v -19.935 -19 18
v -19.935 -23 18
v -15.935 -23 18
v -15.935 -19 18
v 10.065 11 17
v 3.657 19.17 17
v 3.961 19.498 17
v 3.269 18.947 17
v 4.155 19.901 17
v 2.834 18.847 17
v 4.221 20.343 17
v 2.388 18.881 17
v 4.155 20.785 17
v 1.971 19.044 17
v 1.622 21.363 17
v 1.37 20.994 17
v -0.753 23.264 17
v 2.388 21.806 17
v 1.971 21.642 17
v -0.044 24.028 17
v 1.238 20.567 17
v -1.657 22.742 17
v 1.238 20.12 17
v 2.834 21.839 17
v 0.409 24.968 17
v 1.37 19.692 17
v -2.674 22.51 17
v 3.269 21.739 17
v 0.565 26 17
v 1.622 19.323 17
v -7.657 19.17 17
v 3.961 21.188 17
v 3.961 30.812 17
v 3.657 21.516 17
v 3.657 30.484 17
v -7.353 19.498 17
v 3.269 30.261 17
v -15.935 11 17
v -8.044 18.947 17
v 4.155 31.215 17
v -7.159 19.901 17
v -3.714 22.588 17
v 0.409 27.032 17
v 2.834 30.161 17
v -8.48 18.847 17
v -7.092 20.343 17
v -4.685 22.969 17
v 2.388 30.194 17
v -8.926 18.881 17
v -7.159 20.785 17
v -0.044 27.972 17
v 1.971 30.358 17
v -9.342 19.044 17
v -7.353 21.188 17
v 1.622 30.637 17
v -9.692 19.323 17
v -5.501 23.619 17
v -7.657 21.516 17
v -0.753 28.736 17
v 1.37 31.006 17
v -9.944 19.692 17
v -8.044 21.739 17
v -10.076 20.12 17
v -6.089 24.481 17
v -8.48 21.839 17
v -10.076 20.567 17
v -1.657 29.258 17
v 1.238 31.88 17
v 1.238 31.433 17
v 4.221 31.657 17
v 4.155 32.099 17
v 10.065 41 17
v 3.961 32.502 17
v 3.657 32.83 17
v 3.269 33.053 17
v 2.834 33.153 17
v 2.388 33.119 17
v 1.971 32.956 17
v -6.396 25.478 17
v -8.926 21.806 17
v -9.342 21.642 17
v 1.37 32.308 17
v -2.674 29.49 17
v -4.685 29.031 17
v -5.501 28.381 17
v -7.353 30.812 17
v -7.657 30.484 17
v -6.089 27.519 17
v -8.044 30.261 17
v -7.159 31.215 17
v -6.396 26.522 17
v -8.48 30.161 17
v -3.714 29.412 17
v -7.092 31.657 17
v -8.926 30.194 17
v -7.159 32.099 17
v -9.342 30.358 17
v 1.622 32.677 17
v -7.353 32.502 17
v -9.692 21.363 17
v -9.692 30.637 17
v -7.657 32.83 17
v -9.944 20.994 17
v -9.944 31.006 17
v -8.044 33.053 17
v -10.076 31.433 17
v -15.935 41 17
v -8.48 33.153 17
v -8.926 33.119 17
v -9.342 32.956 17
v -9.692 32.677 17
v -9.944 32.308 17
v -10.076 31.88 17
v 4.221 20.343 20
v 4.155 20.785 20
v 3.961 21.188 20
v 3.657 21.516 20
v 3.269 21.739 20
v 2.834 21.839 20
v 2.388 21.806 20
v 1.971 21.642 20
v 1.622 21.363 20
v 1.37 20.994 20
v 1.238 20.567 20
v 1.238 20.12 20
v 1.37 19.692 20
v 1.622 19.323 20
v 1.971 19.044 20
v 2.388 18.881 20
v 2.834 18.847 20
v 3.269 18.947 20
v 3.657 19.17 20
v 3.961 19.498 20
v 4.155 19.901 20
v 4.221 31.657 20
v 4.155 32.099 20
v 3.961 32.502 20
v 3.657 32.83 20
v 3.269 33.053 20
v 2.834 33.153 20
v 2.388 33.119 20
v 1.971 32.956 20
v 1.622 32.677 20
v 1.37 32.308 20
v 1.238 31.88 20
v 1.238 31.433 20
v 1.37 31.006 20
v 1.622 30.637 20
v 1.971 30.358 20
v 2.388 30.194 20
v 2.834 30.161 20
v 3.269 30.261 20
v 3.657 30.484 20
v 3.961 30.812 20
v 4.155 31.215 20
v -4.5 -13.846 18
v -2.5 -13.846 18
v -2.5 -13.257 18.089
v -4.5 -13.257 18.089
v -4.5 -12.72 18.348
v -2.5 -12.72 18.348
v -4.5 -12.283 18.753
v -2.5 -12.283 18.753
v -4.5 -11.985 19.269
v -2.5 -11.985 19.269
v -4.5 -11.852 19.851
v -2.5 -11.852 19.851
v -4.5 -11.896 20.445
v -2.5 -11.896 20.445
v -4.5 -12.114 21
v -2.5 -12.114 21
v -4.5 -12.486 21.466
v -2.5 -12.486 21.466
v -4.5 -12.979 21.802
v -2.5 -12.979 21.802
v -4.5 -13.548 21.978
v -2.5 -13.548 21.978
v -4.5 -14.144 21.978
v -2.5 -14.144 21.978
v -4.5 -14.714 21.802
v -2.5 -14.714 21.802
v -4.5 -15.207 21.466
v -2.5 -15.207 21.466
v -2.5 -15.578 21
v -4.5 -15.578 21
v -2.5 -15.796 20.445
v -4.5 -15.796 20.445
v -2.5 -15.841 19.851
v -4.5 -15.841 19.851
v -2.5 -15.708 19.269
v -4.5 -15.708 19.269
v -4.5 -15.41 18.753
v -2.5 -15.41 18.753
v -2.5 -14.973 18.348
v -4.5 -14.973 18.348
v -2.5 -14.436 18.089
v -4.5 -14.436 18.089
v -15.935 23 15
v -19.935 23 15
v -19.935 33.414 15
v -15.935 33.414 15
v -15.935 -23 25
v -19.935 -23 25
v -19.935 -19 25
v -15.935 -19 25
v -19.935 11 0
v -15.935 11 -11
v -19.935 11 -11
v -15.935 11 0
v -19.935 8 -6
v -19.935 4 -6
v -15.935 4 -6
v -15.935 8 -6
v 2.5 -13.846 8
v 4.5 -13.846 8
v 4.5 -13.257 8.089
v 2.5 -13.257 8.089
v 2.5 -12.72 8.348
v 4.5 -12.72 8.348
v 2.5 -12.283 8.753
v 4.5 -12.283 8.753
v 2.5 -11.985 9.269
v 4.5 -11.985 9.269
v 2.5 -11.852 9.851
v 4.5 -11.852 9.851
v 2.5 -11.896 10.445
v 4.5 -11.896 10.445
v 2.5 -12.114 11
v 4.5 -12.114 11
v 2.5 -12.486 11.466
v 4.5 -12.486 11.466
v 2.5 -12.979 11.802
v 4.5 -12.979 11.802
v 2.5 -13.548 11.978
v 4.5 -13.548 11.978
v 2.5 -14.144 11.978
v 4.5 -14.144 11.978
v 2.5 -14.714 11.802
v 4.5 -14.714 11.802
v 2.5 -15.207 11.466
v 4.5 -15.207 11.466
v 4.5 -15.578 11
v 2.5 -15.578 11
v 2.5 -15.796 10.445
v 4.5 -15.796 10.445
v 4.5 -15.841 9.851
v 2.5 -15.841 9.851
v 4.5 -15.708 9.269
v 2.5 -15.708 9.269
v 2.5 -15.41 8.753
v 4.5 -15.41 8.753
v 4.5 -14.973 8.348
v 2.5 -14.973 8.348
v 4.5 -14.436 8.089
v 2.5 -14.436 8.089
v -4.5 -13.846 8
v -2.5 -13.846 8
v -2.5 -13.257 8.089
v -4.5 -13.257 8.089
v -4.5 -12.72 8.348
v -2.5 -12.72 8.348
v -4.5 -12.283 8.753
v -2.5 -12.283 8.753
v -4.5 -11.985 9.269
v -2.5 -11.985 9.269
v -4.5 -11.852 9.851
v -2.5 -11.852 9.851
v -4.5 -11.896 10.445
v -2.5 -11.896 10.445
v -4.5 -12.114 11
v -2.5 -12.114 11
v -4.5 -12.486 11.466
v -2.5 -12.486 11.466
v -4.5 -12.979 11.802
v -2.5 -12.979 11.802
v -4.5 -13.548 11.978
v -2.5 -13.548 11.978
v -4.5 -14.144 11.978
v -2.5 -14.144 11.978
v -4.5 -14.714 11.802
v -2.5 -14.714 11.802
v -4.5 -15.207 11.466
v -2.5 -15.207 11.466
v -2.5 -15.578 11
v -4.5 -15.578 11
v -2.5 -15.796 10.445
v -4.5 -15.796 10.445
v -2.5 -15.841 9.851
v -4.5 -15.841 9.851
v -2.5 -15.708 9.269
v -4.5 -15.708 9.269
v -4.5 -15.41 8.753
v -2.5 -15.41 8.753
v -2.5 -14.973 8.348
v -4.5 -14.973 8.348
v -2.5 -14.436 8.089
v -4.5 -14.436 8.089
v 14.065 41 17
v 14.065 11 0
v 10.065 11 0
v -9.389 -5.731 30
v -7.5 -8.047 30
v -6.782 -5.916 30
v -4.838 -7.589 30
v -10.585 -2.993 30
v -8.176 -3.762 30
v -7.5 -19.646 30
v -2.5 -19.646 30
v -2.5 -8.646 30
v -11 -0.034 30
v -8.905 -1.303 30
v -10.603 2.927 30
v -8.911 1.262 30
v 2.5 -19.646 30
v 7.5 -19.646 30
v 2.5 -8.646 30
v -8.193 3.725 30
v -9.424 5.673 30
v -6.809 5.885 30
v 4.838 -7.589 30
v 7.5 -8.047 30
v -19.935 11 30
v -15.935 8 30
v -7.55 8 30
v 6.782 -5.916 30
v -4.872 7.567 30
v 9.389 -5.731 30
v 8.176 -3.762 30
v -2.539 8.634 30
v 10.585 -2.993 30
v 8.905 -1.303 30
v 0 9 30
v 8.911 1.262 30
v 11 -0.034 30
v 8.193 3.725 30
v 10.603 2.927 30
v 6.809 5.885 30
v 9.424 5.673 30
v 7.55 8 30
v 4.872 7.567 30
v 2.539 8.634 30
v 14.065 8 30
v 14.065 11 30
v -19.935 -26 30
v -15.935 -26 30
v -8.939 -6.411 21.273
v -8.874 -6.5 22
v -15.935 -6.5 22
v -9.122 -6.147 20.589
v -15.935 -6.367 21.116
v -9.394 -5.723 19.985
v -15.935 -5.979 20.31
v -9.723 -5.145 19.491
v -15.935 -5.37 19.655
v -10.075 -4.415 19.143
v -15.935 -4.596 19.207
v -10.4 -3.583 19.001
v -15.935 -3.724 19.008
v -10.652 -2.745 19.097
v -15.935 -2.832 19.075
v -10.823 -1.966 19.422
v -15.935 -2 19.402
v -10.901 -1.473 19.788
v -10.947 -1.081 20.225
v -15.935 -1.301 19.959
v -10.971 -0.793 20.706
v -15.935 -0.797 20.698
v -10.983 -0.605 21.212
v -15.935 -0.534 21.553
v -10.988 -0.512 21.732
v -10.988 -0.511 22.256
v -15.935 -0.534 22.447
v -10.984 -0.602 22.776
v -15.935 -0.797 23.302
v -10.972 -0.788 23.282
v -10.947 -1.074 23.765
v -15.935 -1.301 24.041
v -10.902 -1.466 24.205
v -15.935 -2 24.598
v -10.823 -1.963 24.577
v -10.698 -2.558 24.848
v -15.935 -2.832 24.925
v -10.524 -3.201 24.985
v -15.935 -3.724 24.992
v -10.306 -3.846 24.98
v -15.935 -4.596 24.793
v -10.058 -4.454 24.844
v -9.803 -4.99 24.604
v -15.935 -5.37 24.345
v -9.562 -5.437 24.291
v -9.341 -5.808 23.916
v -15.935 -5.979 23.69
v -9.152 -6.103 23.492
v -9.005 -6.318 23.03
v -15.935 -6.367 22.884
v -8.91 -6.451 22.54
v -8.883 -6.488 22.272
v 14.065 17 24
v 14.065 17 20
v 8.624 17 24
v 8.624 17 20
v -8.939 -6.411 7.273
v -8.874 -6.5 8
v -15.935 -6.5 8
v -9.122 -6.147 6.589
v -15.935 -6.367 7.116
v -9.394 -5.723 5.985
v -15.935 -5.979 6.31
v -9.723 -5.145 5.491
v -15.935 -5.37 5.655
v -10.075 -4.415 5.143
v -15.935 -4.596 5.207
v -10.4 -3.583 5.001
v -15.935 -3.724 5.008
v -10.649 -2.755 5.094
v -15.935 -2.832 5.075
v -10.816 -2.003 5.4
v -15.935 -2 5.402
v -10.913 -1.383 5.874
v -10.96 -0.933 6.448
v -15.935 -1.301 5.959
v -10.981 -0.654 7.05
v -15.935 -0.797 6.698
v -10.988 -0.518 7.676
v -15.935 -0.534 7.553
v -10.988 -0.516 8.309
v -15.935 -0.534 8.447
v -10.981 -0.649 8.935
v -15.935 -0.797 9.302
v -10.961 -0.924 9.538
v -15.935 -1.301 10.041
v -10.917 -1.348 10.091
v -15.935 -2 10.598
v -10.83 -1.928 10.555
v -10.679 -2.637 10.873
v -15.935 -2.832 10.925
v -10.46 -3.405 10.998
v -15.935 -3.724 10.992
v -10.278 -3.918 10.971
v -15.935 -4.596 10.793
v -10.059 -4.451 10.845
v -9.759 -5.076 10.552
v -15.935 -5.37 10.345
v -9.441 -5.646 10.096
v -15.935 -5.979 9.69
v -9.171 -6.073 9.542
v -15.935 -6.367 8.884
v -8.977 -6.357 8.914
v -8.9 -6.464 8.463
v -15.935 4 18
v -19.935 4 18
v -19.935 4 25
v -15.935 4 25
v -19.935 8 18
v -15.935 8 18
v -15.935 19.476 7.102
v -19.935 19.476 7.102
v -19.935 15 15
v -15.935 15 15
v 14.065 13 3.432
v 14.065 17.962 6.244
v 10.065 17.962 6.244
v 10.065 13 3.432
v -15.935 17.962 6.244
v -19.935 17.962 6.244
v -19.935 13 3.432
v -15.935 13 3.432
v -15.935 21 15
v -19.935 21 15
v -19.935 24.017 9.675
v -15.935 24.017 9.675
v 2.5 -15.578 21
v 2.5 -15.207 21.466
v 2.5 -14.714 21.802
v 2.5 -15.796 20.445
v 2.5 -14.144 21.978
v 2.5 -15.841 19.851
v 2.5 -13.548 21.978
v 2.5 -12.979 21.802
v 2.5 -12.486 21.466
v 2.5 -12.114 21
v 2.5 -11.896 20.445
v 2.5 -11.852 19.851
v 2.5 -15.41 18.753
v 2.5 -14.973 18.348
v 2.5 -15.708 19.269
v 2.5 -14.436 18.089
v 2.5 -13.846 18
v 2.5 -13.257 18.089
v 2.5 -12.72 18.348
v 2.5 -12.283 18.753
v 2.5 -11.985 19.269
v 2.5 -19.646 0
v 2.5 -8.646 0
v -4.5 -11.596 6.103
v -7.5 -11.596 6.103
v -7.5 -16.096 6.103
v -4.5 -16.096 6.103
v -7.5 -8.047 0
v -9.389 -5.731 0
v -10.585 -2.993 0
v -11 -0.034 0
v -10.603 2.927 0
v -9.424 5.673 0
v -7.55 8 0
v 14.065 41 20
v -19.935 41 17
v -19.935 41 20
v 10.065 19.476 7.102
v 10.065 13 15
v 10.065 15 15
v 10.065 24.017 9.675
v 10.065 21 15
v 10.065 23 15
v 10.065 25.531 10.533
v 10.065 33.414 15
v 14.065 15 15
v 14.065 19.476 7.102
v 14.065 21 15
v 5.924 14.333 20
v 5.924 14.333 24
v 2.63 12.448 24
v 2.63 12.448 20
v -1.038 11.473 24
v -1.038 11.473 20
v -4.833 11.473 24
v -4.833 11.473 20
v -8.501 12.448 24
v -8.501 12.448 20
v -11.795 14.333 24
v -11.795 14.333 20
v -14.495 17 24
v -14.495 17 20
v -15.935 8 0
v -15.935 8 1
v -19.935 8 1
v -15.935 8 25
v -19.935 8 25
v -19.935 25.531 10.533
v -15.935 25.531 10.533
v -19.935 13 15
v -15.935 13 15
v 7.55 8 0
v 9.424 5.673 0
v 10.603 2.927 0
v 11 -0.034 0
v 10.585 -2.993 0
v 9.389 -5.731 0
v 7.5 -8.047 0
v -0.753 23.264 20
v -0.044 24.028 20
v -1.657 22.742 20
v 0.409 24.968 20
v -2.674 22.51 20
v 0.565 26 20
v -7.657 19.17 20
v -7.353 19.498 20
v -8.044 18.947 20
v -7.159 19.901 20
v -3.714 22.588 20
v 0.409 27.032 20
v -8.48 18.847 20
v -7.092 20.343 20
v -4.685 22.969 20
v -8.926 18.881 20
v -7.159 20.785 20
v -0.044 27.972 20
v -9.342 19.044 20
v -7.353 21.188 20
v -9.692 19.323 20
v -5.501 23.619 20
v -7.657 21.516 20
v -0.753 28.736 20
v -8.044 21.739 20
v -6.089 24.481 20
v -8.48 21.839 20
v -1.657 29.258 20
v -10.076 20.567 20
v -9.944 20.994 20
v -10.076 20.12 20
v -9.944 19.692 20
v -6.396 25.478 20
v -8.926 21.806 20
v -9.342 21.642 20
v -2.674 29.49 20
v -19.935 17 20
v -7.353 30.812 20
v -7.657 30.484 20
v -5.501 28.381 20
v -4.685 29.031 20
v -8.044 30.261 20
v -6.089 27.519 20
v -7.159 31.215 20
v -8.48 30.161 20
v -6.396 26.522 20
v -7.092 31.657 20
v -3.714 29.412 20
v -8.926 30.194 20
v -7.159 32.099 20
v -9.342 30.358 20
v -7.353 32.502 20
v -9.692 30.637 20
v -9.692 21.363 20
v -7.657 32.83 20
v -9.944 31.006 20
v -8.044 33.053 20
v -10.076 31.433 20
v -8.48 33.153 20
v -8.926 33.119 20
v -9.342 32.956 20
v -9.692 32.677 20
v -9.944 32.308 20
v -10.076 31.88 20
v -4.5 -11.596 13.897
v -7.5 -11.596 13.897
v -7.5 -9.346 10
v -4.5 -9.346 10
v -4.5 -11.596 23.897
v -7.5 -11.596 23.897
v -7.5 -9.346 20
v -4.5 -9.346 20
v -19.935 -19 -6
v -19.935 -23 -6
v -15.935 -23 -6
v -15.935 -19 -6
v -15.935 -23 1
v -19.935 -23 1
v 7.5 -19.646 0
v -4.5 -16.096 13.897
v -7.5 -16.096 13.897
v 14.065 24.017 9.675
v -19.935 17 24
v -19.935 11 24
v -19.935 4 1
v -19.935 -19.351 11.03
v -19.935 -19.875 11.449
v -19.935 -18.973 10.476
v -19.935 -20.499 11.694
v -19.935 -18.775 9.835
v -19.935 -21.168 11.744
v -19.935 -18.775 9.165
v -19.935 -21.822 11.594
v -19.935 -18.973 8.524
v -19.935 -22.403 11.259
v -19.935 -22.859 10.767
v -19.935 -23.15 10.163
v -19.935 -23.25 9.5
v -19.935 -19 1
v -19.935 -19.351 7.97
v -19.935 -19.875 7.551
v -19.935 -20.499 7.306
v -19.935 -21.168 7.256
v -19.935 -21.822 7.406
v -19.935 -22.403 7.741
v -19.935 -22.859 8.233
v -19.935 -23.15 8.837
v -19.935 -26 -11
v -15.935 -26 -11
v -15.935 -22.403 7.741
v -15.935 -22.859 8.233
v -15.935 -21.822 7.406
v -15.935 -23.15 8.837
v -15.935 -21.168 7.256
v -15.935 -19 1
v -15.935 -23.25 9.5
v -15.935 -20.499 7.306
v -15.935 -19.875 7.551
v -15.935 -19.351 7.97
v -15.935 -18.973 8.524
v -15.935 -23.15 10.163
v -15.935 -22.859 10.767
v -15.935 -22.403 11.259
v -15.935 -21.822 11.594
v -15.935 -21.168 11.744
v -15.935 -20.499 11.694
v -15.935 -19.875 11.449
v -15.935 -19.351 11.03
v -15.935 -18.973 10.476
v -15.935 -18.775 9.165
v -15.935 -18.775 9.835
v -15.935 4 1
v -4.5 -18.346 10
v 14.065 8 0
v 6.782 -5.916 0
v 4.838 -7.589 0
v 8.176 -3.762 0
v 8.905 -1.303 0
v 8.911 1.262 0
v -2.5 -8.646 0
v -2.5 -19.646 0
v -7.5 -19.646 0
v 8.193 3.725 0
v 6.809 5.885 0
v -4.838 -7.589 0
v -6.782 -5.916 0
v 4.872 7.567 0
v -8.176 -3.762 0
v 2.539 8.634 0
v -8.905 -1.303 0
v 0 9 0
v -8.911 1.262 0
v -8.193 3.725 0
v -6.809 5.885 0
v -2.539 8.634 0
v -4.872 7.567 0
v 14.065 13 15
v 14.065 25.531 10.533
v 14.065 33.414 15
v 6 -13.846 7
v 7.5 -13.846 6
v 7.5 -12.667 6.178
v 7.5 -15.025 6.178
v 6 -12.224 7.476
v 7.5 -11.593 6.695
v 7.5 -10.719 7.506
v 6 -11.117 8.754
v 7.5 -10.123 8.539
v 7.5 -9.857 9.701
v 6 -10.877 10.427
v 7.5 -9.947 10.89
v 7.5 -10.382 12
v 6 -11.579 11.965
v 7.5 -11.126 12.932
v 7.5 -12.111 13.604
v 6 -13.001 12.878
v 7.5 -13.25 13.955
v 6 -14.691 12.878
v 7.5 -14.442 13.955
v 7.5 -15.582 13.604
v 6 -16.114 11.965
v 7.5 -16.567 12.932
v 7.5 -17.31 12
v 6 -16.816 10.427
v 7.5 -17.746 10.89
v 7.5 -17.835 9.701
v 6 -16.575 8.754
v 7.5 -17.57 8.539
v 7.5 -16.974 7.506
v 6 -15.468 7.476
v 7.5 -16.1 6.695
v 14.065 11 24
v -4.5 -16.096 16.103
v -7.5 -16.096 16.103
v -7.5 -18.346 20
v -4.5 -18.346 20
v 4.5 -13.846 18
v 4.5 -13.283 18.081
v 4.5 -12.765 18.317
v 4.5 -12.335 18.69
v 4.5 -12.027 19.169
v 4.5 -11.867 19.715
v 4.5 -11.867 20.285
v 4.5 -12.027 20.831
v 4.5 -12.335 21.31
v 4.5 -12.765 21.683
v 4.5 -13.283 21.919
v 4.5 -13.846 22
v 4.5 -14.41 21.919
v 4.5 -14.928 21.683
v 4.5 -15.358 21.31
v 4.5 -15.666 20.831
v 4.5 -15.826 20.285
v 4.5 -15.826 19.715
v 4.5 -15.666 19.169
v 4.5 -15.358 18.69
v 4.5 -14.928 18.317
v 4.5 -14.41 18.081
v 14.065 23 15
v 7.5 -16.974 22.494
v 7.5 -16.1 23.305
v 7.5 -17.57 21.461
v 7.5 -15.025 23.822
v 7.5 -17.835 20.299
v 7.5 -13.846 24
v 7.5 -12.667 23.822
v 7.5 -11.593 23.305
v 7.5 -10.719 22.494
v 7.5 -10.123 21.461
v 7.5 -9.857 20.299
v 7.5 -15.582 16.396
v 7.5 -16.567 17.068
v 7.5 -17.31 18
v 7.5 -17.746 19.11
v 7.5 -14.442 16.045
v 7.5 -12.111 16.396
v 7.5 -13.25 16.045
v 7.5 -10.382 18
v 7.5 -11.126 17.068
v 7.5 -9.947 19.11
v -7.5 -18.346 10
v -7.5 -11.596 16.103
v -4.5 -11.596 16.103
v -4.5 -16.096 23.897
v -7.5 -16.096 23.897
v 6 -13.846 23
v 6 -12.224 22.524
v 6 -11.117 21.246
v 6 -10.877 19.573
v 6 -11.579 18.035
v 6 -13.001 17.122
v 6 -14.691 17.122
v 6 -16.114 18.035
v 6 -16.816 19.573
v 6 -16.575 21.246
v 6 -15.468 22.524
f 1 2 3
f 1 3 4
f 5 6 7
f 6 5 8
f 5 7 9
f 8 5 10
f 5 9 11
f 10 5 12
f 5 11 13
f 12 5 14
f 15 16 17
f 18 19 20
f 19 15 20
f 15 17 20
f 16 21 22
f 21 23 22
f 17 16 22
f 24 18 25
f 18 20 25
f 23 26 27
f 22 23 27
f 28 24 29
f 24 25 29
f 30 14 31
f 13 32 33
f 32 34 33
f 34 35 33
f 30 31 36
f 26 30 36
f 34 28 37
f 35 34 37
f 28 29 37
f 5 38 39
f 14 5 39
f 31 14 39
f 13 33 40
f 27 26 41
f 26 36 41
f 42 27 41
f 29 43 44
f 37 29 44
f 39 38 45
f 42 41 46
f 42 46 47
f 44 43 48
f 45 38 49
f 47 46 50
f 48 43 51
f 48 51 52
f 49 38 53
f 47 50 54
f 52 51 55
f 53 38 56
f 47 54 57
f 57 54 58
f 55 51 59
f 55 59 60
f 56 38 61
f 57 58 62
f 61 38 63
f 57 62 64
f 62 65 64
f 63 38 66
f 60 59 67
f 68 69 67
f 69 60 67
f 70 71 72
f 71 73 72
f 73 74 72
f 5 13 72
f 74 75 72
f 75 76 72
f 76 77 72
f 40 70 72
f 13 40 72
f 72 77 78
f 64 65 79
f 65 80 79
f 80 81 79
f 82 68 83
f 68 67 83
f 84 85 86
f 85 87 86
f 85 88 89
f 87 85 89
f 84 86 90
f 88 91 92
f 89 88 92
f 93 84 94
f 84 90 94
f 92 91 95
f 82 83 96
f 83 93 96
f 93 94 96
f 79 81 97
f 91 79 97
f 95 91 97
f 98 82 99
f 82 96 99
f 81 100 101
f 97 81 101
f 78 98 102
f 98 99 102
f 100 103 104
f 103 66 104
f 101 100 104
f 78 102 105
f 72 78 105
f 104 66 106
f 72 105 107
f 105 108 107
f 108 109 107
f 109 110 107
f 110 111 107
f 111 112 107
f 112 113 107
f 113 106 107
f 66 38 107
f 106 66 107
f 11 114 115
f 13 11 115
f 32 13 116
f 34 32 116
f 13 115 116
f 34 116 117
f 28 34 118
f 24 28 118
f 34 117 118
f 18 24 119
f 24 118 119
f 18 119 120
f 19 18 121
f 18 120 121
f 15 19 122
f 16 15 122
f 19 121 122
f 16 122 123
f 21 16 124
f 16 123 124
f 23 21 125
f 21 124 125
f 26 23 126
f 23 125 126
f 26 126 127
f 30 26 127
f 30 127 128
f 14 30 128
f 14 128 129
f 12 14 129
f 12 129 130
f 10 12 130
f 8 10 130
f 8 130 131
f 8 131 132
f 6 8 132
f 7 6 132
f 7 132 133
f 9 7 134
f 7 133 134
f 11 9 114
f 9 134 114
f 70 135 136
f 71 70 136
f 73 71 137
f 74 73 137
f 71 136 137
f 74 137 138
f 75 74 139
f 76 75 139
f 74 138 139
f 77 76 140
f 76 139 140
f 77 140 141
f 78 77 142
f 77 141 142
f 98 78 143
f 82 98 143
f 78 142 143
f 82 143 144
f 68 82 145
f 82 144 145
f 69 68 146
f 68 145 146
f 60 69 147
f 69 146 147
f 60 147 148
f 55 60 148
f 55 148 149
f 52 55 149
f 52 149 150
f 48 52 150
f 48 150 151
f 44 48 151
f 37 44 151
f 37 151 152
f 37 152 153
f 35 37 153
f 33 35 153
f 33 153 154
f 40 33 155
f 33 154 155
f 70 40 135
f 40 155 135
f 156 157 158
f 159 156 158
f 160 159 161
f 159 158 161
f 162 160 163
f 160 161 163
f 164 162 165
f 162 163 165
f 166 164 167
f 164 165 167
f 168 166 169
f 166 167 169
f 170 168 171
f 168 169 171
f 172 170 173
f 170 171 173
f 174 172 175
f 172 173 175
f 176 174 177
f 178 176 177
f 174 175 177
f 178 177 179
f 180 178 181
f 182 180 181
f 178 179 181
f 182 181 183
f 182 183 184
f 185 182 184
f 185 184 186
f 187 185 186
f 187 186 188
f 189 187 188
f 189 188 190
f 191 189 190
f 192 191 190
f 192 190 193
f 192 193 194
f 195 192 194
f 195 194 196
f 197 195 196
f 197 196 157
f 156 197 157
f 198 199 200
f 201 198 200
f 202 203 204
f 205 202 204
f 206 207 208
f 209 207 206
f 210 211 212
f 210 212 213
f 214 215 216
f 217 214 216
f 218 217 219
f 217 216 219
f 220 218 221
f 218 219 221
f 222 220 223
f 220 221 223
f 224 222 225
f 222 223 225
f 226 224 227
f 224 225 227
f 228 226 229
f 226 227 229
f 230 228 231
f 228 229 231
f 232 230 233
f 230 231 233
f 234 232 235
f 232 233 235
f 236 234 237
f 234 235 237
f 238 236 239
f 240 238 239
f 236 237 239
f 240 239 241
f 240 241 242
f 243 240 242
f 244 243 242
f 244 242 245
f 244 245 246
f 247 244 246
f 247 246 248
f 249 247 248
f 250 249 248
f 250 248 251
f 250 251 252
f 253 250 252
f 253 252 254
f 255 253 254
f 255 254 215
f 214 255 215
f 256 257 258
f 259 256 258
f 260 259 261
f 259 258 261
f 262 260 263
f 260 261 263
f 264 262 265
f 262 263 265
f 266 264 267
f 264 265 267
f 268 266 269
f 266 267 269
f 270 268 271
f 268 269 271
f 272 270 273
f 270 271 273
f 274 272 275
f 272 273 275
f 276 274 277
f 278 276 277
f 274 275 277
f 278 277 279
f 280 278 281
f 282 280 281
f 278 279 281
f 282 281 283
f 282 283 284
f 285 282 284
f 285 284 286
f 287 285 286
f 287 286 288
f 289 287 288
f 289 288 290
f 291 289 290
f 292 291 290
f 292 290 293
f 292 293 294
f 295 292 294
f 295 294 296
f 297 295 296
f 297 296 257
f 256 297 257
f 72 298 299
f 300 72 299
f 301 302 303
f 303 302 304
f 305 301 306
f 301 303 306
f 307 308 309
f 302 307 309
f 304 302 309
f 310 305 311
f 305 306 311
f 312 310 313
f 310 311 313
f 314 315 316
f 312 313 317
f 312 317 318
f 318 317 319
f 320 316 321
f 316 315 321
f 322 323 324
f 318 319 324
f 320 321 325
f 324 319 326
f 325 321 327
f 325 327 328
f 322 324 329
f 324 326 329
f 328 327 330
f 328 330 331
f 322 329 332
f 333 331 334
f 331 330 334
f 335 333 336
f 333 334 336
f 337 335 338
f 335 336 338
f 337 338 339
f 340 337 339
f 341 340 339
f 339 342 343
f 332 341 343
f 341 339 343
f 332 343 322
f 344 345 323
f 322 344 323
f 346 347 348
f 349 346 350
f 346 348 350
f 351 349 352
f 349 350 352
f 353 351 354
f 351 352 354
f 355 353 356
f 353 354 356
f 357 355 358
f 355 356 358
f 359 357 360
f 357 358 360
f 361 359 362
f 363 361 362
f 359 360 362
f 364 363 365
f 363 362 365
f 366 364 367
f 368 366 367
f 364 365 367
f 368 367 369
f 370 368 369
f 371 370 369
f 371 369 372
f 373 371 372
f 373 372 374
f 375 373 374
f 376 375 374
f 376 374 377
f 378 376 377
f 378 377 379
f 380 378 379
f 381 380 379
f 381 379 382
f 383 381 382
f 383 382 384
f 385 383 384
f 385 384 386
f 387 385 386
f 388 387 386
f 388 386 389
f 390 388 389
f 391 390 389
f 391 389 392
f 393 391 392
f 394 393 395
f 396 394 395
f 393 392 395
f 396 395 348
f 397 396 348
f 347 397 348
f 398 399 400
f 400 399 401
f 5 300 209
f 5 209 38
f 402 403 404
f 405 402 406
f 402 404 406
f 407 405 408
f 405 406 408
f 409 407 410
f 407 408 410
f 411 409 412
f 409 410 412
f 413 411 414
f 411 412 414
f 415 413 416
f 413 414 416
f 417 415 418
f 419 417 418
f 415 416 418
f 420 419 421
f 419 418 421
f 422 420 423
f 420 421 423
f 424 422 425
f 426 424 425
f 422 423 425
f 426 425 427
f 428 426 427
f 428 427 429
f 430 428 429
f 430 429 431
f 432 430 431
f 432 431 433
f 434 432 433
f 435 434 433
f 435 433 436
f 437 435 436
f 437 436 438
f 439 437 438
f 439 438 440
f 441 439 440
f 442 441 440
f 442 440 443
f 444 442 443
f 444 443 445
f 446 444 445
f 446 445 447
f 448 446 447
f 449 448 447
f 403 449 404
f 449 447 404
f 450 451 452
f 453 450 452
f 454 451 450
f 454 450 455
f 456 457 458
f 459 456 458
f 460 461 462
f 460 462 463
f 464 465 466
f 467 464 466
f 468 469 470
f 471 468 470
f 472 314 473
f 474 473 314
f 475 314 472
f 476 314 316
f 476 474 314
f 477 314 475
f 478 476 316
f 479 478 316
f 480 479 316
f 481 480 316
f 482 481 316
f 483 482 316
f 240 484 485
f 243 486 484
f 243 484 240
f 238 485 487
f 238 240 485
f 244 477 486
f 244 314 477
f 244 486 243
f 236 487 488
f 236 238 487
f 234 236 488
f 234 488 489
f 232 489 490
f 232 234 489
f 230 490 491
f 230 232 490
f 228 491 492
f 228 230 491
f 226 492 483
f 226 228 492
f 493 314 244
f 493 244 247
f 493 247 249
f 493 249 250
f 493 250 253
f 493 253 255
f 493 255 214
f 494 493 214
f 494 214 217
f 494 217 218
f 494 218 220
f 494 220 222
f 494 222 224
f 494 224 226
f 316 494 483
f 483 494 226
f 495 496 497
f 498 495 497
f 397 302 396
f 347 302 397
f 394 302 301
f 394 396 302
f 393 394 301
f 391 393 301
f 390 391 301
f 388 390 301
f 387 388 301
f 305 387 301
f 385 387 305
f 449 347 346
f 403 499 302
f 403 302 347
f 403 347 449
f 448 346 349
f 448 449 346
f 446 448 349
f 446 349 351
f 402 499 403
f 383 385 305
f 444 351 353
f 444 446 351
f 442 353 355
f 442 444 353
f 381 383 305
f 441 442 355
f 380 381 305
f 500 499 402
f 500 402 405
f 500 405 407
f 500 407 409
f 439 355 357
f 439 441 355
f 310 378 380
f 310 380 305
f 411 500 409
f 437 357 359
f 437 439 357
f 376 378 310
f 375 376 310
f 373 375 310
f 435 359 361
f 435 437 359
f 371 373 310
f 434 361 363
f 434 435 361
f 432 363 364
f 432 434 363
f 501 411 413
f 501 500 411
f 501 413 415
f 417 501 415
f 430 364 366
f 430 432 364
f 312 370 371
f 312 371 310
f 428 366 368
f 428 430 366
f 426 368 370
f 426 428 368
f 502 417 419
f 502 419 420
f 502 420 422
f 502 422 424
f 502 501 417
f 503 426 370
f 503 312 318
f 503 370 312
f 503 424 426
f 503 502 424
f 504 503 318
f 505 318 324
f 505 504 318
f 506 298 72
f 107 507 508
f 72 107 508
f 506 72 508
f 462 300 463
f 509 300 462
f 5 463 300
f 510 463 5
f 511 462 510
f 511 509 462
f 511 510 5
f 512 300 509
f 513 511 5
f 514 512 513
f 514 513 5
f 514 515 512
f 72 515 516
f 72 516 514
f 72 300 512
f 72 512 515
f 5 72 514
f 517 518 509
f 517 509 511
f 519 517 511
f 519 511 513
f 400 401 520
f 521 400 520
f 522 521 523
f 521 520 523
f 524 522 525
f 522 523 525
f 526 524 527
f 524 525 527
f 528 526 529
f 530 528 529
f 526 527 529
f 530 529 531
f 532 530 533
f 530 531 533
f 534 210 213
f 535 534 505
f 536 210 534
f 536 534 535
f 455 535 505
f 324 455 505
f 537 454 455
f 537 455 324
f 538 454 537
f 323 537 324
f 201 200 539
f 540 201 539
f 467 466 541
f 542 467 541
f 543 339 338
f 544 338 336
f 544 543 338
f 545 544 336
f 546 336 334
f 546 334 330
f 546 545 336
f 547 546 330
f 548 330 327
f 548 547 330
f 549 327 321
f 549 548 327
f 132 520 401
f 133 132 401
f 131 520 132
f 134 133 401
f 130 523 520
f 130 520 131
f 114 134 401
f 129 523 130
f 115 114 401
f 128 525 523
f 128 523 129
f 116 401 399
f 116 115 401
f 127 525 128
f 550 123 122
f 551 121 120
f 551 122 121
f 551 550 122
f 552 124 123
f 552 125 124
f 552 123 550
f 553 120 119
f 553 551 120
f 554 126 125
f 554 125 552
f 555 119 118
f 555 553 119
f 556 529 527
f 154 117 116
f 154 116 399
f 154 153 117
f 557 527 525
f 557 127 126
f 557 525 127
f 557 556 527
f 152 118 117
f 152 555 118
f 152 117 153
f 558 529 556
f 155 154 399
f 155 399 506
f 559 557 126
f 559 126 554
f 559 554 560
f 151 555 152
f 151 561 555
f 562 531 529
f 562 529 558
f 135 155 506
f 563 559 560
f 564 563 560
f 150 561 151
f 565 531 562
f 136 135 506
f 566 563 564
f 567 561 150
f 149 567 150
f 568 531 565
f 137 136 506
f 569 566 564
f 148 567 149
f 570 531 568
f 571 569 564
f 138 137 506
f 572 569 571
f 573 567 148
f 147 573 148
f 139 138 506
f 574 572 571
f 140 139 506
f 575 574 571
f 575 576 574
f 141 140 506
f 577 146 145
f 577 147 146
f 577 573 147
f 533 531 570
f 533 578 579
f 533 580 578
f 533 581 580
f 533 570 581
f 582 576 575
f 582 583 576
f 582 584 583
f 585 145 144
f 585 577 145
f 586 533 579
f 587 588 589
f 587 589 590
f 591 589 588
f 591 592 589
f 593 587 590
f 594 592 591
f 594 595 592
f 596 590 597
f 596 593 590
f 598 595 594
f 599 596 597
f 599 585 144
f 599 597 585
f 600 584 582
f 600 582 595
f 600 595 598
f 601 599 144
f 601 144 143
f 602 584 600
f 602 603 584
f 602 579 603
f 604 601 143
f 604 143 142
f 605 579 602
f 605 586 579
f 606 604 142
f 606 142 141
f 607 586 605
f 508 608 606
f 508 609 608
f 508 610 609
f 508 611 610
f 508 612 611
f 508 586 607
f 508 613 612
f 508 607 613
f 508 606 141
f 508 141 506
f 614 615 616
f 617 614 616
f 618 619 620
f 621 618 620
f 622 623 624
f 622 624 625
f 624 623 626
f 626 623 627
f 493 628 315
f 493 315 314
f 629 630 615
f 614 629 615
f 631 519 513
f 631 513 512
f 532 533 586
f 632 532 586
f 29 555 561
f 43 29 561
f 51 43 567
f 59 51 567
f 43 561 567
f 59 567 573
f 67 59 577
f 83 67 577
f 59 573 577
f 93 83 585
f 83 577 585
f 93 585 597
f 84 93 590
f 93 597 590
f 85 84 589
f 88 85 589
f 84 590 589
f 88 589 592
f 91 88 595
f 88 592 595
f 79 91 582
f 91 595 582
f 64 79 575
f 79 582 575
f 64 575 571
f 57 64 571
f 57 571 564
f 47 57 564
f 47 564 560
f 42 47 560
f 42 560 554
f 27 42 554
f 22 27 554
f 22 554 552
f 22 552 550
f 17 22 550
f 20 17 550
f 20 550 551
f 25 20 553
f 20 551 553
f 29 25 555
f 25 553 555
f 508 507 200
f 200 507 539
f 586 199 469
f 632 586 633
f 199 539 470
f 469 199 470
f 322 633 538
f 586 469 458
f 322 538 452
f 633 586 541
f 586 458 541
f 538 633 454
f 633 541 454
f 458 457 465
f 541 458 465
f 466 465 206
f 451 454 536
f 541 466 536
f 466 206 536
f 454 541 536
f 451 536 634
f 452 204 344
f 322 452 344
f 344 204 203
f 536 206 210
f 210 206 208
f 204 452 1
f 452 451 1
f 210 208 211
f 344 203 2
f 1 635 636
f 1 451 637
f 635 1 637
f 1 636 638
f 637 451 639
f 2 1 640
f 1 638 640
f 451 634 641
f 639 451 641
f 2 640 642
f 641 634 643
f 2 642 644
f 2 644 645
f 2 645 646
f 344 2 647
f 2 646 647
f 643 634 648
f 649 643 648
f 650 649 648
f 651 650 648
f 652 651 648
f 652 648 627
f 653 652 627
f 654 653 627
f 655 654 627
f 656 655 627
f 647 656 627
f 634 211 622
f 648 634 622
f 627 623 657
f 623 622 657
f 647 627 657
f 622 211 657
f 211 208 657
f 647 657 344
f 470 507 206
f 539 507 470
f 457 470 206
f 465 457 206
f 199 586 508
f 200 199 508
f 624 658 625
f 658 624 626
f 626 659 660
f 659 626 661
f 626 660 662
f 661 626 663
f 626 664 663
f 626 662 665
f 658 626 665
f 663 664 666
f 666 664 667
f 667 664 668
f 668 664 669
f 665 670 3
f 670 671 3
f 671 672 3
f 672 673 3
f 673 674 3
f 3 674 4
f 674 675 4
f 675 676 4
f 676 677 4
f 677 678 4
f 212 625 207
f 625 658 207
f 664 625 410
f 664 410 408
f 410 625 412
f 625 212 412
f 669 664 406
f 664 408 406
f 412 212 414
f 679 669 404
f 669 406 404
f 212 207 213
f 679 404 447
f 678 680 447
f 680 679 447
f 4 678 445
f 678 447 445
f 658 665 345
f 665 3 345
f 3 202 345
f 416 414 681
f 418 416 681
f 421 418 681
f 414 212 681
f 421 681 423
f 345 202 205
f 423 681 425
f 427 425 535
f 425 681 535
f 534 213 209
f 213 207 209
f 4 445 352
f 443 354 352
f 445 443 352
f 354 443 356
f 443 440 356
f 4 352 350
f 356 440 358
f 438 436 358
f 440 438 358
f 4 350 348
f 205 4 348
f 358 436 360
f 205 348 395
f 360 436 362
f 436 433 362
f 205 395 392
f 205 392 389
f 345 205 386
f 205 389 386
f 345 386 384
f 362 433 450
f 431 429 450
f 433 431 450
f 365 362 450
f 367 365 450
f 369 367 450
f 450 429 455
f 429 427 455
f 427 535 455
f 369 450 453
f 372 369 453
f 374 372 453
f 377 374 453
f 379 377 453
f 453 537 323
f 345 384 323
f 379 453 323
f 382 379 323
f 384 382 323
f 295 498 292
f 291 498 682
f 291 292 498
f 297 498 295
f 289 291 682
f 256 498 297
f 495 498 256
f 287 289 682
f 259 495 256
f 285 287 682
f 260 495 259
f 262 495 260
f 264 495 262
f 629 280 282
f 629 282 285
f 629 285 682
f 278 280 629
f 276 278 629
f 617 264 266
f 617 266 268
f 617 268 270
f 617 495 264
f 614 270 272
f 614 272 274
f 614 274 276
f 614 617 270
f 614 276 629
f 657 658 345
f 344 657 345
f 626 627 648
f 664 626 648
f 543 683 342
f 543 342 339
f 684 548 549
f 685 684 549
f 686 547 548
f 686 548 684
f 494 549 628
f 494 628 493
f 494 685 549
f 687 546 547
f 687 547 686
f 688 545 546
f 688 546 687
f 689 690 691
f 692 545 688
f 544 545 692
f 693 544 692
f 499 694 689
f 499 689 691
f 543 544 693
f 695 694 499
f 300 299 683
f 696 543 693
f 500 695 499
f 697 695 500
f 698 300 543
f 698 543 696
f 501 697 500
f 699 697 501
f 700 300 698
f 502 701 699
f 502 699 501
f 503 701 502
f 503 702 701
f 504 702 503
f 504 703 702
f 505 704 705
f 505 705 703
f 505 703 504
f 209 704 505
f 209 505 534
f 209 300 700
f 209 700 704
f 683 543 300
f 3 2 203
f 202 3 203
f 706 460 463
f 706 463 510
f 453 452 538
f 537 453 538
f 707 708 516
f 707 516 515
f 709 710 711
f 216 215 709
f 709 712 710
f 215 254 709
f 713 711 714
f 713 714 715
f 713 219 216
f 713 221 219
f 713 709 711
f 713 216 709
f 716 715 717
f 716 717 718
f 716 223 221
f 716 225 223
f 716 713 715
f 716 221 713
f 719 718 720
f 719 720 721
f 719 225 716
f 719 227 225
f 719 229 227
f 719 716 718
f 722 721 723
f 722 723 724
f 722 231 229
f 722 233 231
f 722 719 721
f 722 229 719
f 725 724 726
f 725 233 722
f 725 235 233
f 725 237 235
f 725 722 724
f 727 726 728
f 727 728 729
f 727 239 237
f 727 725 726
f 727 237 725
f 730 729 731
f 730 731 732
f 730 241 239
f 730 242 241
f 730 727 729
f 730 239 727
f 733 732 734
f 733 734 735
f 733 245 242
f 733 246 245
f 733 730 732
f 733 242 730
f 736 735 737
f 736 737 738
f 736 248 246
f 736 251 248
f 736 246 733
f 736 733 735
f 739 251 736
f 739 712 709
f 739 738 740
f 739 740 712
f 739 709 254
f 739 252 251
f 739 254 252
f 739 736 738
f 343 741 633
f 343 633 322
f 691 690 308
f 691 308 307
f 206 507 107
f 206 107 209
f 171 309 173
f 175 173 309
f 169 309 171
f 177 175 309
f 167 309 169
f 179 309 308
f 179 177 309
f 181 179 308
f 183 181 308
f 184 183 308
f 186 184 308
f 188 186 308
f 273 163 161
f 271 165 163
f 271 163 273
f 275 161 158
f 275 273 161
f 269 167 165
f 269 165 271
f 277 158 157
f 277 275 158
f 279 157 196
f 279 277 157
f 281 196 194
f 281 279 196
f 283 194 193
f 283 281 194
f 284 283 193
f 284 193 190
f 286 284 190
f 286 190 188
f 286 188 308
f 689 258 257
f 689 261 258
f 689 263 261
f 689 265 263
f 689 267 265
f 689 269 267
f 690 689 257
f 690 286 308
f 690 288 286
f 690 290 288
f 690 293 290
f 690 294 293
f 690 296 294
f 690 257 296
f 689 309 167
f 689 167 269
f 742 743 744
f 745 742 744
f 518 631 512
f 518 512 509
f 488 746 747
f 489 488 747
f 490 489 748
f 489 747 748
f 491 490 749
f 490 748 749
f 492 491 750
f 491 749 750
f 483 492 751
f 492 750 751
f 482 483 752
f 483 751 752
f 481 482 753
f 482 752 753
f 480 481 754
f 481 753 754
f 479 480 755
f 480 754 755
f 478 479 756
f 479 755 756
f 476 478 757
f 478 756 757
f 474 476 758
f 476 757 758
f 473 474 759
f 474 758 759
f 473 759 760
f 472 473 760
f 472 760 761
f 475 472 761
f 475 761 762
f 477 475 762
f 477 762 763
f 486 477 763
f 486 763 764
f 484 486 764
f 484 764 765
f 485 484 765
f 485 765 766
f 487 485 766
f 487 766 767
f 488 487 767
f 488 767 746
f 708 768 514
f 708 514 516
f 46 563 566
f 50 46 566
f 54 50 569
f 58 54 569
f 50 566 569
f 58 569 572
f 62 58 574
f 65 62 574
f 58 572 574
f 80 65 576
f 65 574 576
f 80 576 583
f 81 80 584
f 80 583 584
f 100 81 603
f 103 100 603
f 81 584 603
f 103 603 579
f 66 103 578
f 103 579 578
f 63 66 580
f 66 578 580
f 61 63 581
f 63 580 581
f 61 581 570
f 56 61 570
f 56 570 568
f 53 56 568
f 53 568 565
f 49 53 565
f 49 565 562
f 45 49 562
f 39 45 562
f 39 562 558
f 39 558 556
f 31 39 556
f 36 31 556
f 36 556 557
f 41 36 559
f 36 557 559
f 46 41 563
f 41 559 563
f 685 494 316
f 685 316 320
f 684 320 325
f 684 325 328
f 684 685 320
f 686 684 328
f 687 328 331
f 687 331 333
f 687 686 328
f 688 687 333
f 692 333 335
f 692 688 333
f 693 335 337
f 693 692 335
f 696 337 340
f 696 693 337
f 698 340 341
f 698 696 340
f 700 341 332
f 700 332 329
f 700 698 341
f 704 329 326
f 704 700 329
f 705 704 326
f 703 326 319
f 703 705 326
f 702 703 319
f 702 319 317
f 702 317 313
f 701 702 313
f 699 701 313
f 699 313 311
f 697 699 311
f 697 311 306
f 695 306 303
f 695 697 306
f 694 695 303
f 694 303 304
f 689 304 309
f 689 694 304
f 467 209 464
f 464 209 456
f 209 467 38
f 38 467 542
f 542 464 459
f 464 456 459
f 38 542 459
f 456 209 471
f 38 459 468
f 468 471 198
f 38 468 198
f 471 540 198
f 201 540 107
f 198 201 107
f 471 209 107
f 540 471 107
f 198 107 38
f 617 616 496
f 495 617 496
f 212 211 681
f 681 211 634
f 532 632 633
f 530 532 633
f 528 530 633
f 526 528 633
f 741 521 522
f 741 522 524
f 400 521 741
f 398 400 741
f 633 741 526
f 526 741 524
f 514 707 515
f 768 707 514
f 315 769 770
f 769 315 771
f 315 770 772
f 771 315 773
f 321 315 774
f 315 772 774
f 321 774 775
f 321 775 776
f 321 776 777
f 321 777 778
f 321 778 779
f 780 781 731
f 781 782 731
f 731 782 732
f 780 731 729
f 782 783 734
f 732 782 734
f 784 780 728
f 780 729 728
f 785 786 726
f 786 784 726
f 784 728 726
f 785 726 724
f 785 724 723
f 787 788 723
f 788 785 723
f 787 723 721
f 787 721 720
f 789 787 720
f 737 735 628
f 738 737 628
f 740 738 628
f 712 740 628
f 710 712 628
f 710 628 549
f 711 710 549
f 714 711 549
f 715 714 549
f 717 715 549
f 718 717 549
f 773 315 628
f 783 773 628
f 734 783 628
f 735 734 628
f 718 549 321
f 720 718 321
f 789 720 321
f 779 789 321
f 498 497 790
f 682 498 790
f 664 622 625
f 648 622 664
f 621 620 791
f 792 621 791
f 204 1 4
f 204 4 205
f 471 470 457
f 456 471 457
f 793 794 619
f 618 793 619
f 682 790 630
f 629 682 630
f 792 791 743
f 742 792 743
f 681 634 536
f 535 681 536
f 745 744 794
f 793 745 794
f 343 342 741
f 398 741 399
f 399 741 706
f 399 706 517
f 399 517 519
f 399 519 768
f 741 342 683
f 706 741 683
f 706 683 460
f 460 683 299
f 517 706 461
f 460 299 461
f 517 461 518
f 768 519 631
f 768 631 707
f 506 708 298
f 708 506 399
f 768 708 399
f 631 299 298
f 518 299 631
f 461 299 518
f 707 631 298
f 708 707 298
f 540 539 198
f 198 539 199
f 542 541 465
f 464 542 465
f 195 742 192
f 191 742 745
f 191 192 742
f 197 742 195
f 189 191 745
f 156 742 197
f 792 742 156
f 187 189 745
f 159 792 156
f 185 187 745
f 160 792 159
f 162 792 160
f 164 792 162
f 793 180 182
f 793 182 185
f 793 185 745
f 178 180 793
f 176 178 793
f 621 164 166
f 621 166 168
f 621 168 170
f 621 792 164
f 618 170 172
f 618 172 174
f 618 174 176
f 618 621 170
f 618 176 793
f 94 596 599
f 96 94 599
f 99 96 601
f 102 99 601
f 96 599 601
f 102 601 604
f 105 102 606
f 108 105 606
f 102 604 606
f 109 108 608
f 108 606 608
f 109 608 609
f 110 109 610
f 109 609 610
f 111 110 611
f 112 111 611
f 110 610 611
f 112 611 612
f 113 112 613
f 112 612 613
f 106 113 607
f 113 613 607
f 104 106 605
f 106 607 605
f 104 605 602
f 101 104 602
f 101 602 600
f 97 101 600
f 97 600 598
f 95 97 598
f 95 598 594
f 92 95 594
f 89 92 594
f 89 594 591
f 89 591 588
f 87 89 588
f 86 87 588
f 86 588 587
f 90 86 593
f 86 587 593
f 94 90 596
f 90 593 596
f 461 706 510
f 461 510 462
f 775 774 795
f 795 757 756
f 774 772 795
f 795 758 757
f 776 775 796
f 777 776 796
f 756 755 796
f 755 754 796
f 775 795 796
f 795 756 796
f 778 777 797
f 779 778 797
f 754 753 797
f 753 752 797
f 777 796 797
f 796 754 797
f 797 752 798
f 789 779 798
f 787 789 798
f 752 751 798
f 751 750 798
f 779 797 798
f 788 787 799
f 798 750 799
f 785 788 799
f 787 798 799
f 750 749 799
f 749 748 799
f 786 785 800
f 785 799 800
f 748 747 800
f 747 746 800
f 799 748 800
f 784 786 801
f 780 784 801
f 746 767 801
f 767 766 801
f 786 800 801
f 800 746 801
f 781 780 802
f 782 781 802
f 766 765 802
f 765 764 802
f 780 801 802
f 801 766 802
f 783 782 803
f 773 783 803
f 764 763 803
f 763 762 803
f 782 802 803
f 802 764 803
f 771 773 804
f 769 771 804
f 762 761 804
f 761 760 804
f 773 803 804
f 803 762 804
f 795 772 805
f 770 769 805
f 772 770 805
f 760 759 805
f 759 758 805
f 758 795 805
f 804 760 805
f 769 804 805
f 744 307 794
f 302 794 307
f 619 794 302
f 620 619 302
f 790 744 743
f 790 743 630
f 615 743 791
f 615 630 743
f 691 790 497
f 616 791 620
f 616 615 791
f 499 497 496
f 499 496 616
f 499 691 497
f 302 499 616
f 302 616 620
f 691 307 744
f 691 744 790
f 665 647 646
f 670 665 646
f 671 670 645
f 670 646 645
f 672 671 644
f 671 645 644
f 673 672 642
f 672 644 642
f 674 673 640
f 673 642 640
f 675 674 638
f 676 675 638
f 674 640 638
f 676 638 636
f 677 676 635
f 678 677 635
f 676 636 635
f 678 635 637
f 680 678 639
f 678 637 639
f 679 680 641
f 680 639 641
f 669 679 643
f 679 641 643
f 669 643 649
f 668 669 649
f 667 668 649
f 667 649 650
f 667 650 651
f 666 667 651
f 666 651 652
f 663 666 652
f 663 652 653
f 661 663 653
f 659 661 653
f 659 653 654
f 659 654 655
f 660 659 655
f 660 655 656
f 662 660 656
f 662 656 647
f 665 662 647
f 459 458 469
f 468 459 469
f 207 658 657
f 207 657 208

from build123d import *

# Parameters (mm, degrees)
SUPPORTOMOTORE_DEPTH       = 30
SCHIZZO22_W                = 5
SCHIZZO22_H                = 3.93366559
ESTENSIONEBASEVITI_DEPTH   = 30
SCHIZZO12_W                = 41
SCHIZZO12_H                = 37
SUPPORTOESC_DEPTH          = 4
SCHIZZO13_W                = 7
SCHIZZO13_H                = 4
FORIFASCETTA_DEPTH         = 4
PILASTRINIESC_REACH        = 51.759
PILASTRINIESC_END_RADIUS   = 11
SCHIZZO14_R                = 3
SCHIZZO15_W                = 3
SCHIZZO15_H                = 30
BASEMOTORE_DEPTH           = 34
SCHIZZO16_R                = 1.5
SCHIZZO16_R_2              = 3.5
FORIMOTORE_DEPTH           = 3
CONTROVENTODESTRO_DEPTH    = 4
SUPPORTOBASEMOTORE_DEPTH   = 4
FORIVITIAGGANCI_REACH      = 59.738
SCHIZZO20_R                = 2
FORODADO_DEPTH             = 3
FOROTIRANTEANTERIORE_REACH = 63.131
SCHIZZO24_R                = 2.25


with BuildPart() as part:
    # Schizzo1 → SupportoMotore (new body)
    with BuildSketch(Plane.XY):
        with BuildLine():
            Line((-2.5, -10.712142643), (-2.5, -15.712142643))
            Line((-2.5, -15.712142643), (-7.5, -15.712142643))
            Line((-7.5, -15.712142643), (-7.5, -8.04673847))
            ThreePointArc((-7.5, -8.04673847), (-10.999946955, -0.034161219), (-7.549834435, 8))
            Line((-7.549834435, 8), (-15.935446939, 8))
            Line((-15.935446939, 8), (-15.935446939, 11))
            Line((-15.935446939, 11), (14.064553061, 11))
            Line((14.064553061, 11), (14.064553061, 8))
            Line((14.064553061, 8), (7.549834435, 8))
            ThreePointArc((7.549834435, 8), (10.999946955, -0.034161219), (7.5, -8.04673847))
            Line((7.5, -8.04673847), (7.5, -15.712142643))
            Line((7.5, -15.712142643), (2.5, -15.712142643))
            Line((2.5, -15.712142643), (2.5, -10.712142643))
            Line((2.5, -10.712142643), (2.5, -8.645808233))
            ThreePointArc((2.5, -8.645808233), (0, 9), (-2.5, -8.645808233))
            Line((-2.5, -8.645808233), (-2.5, -10.712142643))
        make_face()
    extrude(amount=SUPPORTOMOTORE_DEPTH)

    # Schizzo22 → EstensioneBaseViti (add)
    with BuildSketch(Plane(origin=(0, 0, 0), x_dir=(-1, 0, 0), z_dir=(0, 0, -1))):
        with Locations((-5, -17.678975438)):
            Rectangle(SCHIZZO22_W, SCHIZZO22_H)
        with Locations((5, -17.678975438)):
            Rectangle(SCHIZZO22_W, SCHIZZO22_H)
    extrude(amount=-ESTENSIONEBASEVITI_DEPTH)

    # Schizzo12 → SupportoESC (add)
    with BuildSketch(Plane.ZY.offset(15.935446939)):
        with Locations((9.5, -7.5)):
            Rectangle(SCHIZZO12_W, SCHIZZO12_H)
    extrude(amount=SUPPORTOESC_DEPTH)

    # Schizzo13 → ForiFascetta (cut)
    with BuildSketch(Plane.ZY.offset(19.935446939)):
        with Locations((-2.5, 6)):
            Rectangle(SCHIZZO13_W, SCHIZZO13_H)
        with Locations((21.5, 6)):
            Rectangle(SCHIZZO13_W, SCHIZZO13_H)
        with Locations((21.5, -21)):
            Rectangle(SCHIZZO13_W, SCHIZZO13_H)
        with Locations((-2.5, -21)):
            Rectangle(SCHIZZO13_W, SCHIZZO13_H)
    extrude(amount=-FORIFASCETTA_DEPTH, mode=Mode.SUBTRACT)

    # PilastriniESC: up to this cylinder (the profile starts outside it)
    pilastriniesc_end = Plane(origin=(0, 0, 15), z_dir=(0, 0, -1)) * Cylinder(PILASTRINIESC_END_RADIUS, 140.518, mode=Mode.PRIVATE)
    # Schizzo14 → PilastriniESC (add, up to the surface)
    with BuildSketch(Plane(origin=(-15.935446939, 0, 0), x_dir=(0, 0, -1), z_dir=(1, 0, 0)), mode=Mode.PRIVATE) as pilastriniesc_sk1:
        with Locations(Location((-8, -3.5, 0), (0, 0, 270))):
            Circle(SCHIZZO14_R)
    pilastriniesc_tool1 = extrude(pilastriniesc_sk1.sketch, amount=PILASTRINIESC_REACH, mode=Mode.PRIVATE) - pilastriniesc_end
    add(pilastriniesc_tool1.solids().sort_by_distance((-15.935447, -3.5, 8))[0])
    # Schizzo14 → PilastriniESC (add, up to the surface)
    with BuildSketch(Plane(origin=(-15.935446939, 0, 0), x_dir=(0, 0, -1), z_dir=(1, 0, 0)), mode=Mode.PRIVATE) as pilastriniesc_sk2:
        with Locations(Location((-22, -3.5, 0), (0, 0, 270))):
            Circle(SCHIZZO14_R)
    pilastriniesc_tool2 = extrude(pilastriniesc_sk2.sketch, amount=PILASTRINIESC_REACH, mode=Mode.PRIVATE) - pilastriniesc_end
    add(pilastriniesc_tool2.solids().sort_by_distance((-15.935447, -3.5, 22))[0])

    # Schizzo15 → BaseMotore (add)
    with BuildSketch(Plane.ZY.offset(19.935446939)):
        with Locations((18.5, 26)):
            Rectangle(SCHIZZO15_W, SCHIZZO15_H)
    extrude(amount=-BASEMOTORE_DEPTH)

    # Schizzo16 → ForiMotore (cut)
    with BuildSketch(Plane.XY.offset(20)):
        with Locations((-8.592301188, 31.656854249)):
            Circle(SCHIZZO16_R)
        with Locations((2.721407311, 31.656854249)):
            Circle(SCHIZZO16_R)
        with Locations((2.721407311, 20.343145751)):
            Circle(SCHIZZO16_R)
        with Locations((-8.592301188, 20.343145751)):
            Circle(SCHIZZO16_R)
        with Locations((-2.935446939, 26)):
            Circle(SCHIZZO16_R_2)
    extrude(amount=-FORIMOTORE_DEPTH, mode=Mode.SUBTRACT)

    # Schizzo17 → ControventoDestro (add)
    with BuildSketch(Plane.ZY.offset(19.935446939)):
        Polygon((17, 41), (0, 11), (17, 11), align=None)
        Polygon((15, 15), (15, 21), (9.675284069, 24.017339028), (7.101692816, 19.475707404), align=None, mode=Mode.SUBTRACT)
        Polygon((15, 33.413896553), (10.53314782, 25.531216235), (15, 23), align=None, mode=Mode.SUBTRACT)
        Polygon((3.432125287, 13), (15, 13), (6.243829065, 17.961830197), align=None, mode=Mode.SUBTRACT)
    controventodestro = extrude(amount=-CONTROVENTODESTRO_DEPTH)

    # ControventoSinistro: ControventoDestro across plane
    add(controventodestro.mirror(Plane(origin=(-2.935446939, 0, 0), x_dir=(0, 0, 1), z_dir=(1, 0, 0))))

    # Schizzo19 → SupportoBaseMotore (add)
    with BuildSketch(Plane.XY.offset(20)):
        with BuildLine():
            Line((-19.935446939, 11), (14.064553061, 11))
            Line((14.064553061, 11), (14.064553061, 17))
            Line((14.064553061, 17), (8.624072947, 17))
            ThreePointArc((8.624072947, 17), (-2.935446939, 11.35), (-14.494966825, 17))
            Line((-14.494966825, 17), (-19.935446939, 17))
            Line((-19.935446939, 17), (-19.935446939, 11))
        make_face()
    extrude(amount=SUPPORTOBASEMOTORE_DEPTH)

    # ForiVitiAgganci: up to this face of the body (flat: up to its plane)
    forivitiagganci_end = Plane(part.part.faces().sort_by_distance((-7.5, -13.846273351, 15))[0])
    # Schizzo20 → ForiVitiAgganci (cut, up to the picked face)
    with BuildSketch(Plane(origin=(7.5, 0, 0), x_dir=(0, 0, -1), z_dir=(1, 0, 0)), mode=Mode.PRIVATE) as forivitiagganci_sk1:
        with Locations((-20, -13.846273351)):
            Circle(SCHIZZO20_R)
    forivitiagganci_tool1 = split(extrude(forivitiagganci_sk1.sketch, amount=-FORIVITIAGGANCI_REACH, mode=Mode.PRIVATE), bisect_by=forivitiagganci_end, keep=Keep.BOTH, mode=Mode.PRIVATE)
    # Schizzo20 → ForiVitiAgganci (cut, up to the picked face)
    with BuildSketch(Plane(origin=(7.5, 0, 0), x_dir=(0, 0, -1), z_dir=(1, 0, 0)), mode=Mode.PRIVATE) as forivitiagganci_sk2:
        with Locations((-10, -13.846273351)):
            Circle(SCHIZZO20_R)
    forivitiagganci_tool2 = split(extrude(forivitiagganci_sk2.sketch, amount=-FORIVITIAGGANCI_REACH, mode=Mode.PRIVATE), bisect_by=forivitiagganci_end, keep=Keep.BOTH, mode=Mode.PRIVATE)
    add(forivitiagganci_tool1.solids().sort_by(Axis((7.5, -13.846273, 20), (-1, 0, 0)))[0], mode=Mode.SUBTRACT)
    add(forivitiagganci_tool2.solids().sort_by(Axis((7.5, -13.846273, 10), (-1, 0, 0)))[0], mode=Mode.SUBTRACT)

    # Schizzo21 → SvasaturaViteDestra (revolve, cut)
    with BuildSketch(Plane.XY.offset(10), mode=Mode.PRIVATE) as svasaturavitedestra_sk:
        Polygon((7.5, -9.846273351), (4.5, -11.846273351), (4.5, -13.846273351), (7.5, -13.846273351), align=None)
    svasaturavitedestra = revolve(svasaturavitedestra_sk.sketch.rotate(Axis((4.5, -13.846273351, 10), (1, 0, 0)), 270), axis=Axis((4.5, -13.846273351, 10), (1, 0, 0)), mode=Mode.SUBTRACT)

    # SvasaturaViteSinistra: SvasaturaViteDestra across plane
    add(svasaturavitedestra.mirror(Plane.XY.offset(15)), mode=Mode.SUBTRACT)

    # Schizzo23 → ForoDado (cut)
    with BuildSketch(Plane.ZY.offset(7.5)):
        Polygon((6.102885683, -11.596273351), (6.102885683, -16.096273351), (10, -18.346273351), (13.897114317, -16.096273351), (13.897114317, -11.596273351), (10, -9.346273351), align=None)
        Polygon((16.102885683, -11.596273351), (16.102885683, -16.096273351), (20, -18.346273351), (23.897114317, -16.096273351), (23.897114317, -11.596273351), (20, -9.346273351), align=None)
    extrude(amount=-FORODADO_DEPTH, mode=Mode.SUBTRACT)

    # Schizzo24 → ForoTiranteAnteriore (cut, up to next)
    with BuildSketch(Plane.ZY.offset(19.935446939), mode=Mode.PRIVATE) as forotiranteanteriore_sk1:
        with Locations(Location((9.5, -21, 0), (0, 0, 270))):
            Circle(SCHIZZO24_R)
    forotiranteanteriore_tool1 = extrude(forotiranteanteriore_sk1.sketch, amount=-FOROTIRANTEANTERIORE_REACH, mode=Mode.PRIVATE) & part.part
    add(forotiranteanteriore_tool1.solids().sort_by_distance((-19.935447, -21, 9.5))[0], mode=Mode.SUBTRACT)


solid = part.part
